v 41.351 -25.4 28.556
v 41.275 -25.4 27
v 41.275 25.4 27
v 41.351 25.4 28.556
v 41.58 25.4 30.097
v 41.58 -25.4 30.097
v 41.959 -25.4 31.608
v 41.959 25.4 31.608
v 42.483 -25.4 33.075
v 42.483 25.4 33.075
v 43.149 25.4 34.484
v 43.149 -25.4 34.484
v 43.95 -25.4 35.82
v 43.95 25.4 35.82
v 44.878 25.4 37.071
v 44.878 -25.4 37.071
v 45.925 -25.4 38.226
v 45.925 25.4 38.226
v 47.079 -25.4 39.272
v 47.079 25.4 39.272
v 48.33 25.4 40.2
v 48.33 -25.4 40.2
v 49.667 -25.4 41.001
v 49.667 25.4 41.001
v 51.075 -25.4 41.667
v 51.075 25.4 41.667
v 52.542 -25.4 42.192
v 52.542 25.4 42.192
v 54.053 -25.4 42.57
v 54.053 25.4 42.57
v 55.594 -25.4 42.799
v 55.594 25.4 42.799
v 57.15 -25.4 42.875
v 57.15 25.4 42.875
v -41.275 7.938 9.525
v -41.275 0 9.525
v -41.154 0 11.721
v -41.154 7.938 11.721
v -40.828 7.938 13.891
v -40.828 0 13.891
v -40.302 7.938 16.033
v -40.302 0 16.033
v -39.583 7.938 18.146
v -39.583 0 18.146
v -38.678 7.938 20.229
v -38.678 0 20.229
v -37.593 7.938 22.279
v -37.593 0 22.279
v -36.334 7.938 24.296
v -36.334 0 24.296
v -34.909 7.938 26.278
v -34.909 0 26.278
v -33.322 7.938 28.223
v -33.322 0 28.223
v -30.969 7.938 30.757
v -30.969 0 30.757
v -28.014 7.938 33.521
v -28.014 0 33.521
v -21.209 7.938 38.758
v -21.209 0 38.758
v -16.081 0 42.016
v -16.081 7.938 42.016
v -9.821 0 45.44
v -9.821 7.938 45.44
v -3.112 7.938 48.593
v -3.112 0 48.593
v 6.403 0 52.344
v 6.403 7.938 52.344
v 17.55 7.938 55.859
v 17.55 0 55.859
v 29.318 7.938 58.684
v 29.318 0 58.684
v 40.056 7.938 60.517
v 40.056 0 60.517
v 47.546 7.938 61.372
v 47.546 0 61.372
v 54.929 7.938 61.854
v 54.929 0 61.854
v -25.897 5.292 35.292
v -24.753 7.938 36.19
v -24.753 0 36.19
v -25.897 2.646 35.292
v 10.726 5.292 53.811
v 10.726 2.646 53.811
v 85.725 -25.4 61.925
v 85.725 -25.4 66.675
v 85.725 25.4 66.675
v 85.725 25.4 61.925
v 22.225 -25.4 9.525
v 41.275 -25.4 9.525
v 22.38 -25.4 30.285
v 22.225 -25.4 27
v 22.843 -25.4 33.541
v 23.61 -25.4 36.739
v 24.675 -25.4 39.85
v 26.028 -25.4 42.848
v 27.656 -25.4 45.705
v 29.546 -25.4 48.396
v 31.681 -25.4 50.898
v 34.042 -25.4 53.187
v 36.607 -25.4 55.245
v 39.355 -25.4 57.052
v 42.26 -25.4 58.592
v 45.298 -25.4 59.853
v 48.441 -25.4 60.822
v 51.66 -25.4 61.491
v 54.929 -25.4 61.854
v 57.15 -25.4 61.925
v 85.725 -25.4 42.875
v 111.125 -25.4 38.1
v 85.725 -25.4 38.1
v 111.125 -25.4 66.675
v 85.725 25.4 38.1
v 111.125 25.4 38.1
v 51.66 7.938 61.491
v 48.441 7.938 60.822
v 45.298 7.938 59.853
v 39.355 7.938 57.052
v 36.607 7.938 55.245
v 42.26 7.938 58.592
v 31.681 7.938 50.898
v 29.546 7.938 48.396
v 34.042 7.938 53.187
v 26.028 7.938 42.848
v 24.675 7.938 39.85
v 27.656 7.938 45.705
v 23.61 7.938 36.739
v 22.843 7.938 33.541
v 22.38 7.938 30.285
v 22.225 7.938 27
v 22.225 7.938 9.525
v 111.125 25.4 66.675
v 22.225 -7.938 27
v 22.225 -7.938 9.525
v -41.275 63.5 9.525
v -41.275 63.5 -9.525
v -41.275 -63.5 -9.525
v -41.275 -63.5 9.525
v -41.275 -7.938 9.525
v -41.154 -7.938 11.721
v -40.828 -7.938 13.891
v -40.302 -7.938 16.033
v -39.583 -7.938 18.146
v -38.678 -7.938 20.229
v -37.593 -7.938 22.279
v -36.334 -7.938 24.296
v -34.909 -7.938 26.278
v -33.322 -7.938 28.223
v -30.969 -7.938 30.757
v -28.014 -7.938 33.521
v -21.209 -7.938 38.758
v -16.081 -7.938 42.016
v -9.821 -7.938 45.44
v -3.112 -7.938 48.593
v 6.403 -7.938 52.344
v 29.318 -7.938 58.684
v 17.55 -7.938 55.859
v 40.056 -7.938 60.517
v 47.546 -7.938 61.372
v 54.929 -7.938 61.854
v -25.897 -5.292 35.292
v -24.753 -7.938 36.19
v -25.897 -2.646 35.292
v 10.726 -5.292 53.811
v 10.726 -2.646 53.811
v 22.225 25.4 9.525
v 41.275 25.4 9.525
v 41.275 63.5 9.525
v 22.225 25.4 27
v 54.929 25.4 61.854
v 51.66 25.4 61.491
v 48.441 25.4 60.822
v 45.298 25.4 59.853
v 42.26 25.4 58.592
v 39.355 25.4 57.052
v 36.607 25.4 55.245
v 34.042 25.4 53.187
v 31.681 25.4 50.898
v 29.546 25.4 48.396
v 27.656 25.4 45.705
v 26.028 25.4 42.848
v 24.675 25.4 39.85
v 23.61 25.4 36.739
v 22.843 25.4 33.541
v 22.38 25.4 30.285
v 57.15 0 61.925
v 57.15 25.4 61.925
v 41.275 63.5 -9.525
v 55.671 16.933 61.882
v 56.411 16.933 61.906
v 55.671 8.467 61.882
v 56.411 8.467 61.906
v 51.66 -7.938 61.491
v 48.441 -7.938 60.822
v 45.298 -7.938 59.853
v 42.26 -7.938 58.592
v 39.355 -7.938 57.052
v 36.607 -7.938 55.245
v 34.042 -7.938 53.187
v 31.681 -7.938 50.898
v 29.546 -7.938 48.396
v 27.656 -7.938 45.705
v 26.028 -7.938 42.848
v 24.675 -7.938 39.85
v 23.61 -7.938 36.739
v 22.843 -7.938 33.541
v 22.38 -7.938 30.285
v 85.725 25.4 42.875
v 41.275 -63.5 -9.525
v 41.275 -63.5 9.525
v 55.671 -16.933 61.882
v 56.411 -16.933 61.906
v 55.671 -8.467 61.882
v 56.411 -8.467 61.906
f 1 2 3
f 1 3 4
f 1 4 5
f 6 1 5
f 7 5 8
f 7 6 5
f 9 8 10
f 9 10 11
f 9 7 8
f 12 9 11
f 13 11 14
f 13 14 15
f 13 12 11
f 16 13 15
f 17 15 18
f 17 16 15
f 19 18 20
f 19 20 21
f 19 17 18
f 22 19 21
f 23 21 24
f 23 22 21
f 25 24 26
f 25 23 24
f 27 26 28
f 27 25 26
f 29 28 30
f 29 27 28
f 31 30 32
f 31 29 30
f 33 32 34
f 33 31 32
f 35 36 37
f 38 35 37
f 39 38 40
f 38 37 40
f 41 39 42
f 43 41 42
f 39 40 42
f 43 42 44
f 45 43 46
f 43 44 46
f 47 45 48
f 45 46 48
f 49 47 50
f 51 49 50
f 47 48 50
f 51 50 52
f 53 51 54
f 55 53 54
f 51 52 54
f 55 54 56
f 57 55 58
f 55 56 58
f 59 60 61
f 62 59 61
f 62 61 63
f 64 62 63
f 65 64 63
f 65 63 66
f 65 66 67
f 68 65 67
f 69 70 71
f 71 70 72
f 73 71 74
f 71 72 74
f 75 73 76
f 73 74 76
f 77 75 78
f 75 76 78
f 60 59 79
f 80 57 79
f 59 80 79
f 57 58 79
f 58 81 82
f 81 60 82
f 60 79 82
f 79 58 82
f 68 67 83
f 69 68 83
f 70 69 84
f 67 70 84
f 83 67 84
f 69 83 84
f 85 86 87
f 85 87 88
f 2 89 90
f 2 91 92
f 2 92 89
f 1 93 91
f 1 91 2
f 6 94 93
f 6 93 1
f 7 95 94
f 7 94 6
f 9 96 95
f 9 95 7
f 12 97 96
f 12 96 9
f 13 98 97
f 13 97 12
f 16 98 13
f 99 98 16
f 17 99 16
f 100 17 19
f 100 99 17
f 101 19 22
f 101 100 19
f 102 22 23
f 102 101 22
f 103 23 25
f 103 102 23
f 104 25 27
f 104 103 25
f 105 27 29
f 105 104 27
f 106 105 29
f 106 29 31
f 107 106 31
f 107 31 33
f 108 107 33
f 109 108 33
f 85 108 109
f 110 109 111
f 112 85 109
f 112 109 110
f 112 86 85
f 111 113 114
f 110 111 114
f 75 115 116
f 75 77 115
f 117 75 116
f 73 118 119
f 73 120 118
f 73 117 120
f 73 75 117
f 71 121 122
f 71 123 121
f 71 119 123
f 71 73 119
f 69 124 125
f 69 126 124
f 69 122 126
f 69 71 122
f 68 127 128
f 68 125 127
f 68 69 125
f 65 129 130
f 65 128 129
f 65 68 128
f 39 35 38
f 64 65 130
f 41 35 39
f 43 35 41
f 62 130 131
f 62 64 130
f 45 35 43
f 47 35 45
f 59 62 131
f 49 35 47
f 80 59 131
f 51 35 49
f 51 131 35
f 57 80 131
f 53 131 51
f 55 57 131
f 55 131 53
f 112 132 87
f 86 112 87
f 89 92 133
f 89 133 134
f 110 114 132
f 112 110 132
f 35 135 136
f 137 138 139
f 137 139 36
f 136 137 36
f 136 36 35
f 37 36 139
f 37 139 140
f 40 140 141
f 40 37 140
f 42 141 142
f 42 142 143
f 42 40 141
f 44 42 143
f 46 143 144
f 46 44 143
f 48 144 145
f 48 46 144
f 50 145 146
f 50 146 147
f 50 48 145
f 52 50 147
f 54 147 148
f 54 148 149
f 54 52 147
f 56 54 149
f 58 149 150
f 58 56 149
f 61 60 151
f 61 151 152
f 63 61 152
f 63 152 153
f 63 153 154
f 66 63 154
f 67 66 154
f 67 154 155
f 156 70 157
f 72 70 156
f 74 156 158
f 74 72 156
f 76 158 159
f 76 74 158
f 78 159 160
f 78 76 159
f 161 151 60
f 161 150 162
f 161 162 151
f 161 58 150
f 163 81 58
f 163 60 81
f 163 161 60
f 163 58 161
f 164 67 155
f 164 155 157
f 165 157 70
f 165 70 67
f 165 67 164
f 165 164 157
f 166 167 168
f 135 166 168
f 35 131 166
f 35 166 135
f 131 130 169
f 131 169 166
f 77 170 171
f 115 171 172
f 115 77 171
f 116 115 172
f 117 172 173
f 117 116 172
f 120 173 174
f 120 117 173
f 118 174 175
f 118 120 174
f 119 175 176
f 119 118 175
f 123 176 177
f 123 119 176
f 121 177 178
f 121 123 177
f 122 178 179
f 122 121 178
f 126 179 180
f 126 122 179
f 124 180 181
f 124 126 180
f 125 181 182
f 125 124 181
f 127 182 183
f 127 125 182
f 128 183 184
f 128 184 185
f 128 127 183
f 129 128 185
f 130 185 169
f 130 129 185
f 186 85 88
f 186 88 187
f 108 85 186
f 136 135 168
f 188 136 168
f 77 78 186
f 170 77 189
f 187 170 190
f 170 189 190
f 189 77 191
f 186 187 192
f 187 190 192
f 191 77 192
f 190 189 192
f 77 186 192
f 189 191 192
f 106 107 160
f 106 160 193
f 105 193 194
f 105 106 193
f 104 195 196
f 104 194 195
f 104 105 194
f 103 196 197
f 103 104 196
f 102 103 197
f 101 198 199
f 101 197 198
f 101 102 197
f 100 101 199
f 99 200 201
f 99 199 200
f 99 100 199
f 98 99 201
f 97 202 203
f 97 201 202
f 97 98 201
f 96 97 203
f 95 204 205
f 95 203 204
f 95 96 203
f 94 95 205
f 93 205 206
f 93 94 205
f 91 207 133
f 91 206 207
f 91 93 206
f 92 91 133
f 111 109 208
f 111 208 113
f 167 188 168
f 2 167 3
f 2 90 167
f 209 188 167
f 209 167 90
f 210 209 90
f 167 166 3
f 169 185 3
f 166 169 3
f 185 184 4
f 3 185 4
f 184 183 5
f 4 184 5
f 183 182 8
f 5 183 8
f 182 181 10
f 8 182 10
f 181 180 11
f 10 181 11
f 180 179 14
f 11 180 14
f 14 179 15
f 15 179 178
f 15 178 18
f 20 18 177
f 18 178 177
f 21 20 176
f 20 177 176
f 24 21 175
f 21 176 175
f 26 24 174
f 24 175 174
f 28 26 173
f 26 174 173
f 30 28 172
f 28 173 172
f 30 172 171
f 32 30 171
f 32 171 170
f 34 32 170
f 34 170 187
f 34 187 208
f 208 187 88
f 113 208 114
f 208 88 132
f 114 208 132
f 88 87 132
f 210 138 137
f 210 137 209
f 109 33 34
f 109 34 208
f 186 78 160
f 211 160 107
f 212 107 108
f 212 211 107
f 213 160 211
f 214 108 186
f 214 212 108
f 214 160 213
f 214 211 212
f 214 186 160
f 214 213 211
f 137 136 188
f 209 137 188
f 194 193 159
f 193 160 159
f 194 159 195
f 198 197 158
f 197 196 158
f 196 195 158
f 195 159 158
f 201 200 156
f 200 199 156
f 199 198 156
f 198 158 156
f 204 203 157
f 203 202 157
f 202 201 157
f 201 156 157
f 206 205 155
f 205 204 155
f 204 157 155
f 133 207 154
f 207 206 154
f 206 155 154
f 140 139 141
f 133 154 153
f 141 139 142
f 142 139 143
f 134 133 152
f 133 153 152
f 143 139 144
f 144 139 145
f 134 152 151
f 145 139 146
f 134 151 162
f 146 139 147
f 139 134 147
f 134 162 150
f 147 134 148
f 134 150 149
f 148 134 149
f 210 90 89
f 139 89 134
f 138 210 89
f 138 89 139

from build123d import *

# Parameters (mm, degrees)
F1_DEPTH = 63.5
F0_W     = 25.4
F0_H     = 19.05
F2_DEPTH = 25.4
F3_DEPTH = 7.9375


with BuildPart() as f1:
    # F0 (on Front) → F1 (new body, symmetric)
    with BuildSketch(Plane.XZ):
        Polygon((-41.275, 9.525), (-41.275, -9.525), (41.275, -9.525), (41.275, 9.525), (22.225, 9.525), align=None)
    extrude(amount=F1_DEPTH, both=True)

    # F0 (on Front) → F2 (join, symmetric)
    with BuildSketch(Plane.XZ):
        with BuildLine():
            Line((22.225, 9.525), (41.275, 9.525))
            Line((41.275, 9.525), (41.275, 27.0002))
            ThreePointArc((41.275, 27.0002), (45.9246798487, 38.2255201513), (57.15, 42.8752))
            Line((57.15, 42.8752), (60.325, 42.8752))
            Line((60.325, 42.8752), (60.325, 61.9252))
            Line((60.325, 61.9252), (57.15, 61.9252))
            add(Edge.make_bspline(
                [(54.9287877913, 61.8544944459), (55.6719665289, 61.8841036278), (56.4124732559, 61.9076963905), (57.15, 61.9252)],
                knots=[109.6288950018, 109.6288950018, 109.6288950018, 109.6288950018, 111.5045361635, 111.5045361635, 111.5045361635, 111.5045361635], degree=3))
            ThreePointArc((54.9287877913, 61.8544944459), (31.6810830483, 50.8976871965), (22.225, 27.0002))
            Line((22.225, 27.0002), (22.225, 9.525))
        make_face()
        with Locations((73.025, 52.4002)):
            Rectangle(F0_W, F0_H)
        Polygon((85.725, 66.675), (85.725, 61.9252), (85.725, 42.8752), (85.725, 38.1), (111.125, 38.1), (111.125, 66.675), align=None)
    extrude(amount=F2_DEPTH, both=True)

    # F0 (on Front) → F3 (join, symmetric)
    with BuildSketch(Plane.XZ):
        with BuildLine():
            add(Edge.make_bspline(
                [(-41.275, 9.525), (-41.075235058, 37.8396194046), (11.490914143, 60.123874562), (54.9287877913, 61.8544944459)],
                knots=[0, 0, 0, 0, 109.6288950018, 109.6288950018, 109.6288950018, 109.6288950018], degree=3))
            Line((-41.275, 9.525), (22.225, 9.525))
            Line((22.225, 9.525), (22.225, 27.0002))
            ThreePointArc((22.225, 27.0002), (31.6810830483, 50.8976871965), (54.9287877913, 61.8544944459))
        make_face()
    extrude(amount=F3_DEPTH, both=True)


solid = f1.part
